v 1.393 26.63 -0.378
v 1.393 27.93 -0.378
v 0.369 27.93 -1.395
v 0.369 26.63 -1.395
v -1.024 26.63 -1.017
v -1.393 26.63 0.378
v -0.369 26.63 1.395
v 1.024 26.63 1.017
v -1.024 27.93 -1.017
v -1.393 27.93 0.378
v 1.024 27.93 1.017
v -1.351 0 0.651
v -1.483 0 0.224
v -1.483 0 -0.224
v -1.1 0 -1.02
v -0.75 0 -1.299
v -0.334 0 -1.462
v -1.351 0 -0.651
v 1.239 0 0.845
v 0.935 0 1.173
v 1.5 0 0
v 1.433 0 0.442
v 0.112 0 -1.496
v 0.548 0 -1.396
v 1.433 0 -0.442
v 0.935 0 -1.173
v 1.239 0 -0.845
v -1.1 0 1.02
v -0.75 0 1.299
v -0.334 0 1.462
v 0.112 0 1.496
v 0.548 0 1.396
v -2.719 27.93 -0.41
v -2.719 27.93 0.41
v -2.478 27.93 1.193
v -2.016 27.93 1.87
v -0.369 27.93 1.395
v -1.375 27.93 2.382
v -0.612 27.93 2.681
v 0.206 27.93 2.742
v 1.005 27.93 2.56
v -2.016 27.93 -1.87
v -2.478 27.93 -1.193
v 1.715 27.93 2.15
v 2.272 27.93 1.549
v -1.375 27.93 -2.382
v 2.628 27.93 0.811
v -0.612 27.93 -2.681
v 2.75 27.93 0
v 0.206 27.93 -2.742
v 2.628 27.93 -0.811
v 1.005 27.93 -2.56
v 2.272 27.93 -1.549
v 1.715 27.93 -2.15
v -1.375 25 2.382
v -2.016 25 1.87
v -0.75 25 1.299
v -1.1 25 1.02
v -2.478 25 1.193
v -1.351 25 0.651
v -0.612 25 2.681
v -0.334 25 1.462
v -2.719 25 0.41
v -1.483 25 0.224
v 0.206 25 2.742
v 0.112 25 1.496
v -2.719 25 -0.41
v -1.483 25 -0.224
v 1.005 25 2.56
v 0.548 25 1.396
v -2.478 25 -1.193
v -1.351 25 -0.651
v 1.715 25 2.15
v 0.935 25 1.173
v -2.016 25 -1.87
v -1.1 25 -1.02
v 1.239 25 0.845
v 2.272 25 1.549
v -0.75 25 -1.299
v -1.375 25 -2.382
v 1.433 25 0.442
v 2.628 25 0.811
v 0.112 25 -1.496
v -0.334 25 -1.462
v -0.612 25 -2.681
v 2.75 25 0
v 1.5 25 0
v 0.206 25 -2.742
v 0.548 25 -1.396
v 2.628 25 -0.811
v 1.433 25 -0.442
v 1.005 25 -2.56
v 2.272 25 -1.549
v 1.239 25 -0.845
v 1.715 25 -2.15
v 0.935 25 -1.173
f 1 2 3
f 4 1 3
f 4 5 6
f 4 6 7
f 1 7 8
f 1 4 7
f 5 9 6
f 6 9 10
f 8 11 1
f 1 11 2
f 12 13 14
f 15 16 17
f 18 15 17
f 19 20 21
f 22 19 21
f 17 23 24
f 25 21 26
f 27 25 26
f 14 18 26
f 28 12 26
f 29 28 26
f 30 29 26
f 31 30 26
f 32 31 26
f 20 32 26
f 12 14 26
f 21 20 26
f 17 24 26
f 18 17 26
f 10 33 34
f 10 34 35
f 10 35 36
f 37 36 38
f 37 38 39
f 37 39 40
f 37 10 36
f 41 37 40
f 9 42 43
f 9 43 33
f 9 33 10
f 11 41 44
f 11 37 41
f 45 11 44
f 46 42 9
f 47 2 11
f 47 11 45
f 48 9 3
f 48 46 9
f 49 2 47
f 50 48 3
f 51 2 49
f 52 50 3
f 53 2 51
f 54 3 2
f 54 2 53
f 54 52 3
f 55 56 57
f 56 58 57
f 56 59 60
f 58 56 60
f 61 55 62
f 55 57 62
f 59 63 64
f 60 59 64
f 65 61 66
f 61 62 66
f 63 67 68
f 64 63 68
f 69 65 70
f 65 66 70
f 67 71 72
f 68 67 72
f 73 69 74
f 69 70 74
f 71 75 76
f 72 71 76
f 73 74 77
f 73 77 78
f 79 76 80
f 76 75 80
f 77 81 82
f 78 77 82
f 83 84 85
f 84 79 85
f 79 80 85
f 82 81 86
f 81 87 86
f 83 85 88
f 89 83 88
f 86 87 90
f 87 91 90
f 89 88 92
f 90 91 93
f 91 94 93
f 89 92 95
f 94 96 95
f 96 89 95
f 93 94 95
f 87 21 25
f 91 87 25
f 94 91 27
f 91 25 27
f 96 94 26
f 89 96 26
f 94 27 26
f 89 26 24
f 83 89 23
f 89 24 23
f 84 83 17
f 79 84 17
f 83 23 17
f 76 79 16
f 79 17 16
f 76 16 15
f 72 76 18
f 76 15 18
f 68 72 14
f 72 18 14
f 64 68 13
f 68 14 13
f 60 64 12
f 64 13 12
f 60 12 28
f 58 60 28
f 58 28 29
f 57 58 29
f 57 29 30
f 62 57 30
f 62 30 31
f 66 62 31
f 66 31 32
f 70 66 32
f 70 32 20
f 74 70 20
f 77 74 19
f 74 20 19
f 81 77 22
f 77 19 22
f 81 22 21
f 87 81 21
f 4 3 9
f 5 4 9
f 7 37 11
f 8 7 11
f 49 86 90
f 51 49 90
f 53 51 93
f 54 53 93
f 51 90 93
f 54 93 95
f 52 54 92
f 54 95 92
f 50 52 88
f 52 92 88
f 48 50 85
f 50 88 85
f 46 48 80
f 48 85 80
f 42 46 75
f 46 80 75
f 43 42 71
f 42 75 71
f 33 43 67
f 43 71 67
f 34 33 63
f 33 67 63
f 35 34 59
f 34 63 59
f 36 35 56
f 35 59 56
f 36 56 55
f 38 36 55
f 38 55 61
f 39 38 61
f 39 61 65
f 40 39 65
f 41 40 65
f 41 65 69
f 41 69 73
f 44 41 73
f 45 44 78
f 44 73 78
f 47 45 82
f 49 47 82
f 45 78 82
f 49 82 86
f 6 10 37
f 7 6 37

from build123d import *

# Parameters (mm, degrees)
SKETCH_1_R          = 1.5
EXTRUDE_1_DEPTH     = 25
SKETCH_2_R          = 2.75
EXTRUDE_2_DEPTH     = 2.93
CUT_EXTRUDE_1_DEPTH = 1.3


with BuildPart() as part:
    # 草图1 → 凸台-拉伸1 (new body)
    with BuildSketch(Plane(origin=(0, 0, 0), x_dir=(1, 0, 0), z_dir=(0, 1, 0))):
        Circle(SKETCH_1_R)
    extrude(amount=EXTRUDE_1_DEPTH)

    # 草图2 → 凸台-拉伸2 (add)
    with BuildSketch(Plane(origin=(0, 25, 0), x_dir=(1, 0, 0), z_dir=(0, 1, 0))):
        Circle(SKETCH_2_R)
    extrude(amount=EXTRUDE_2_DEPTH)

    # 草图3 → 切除-拉伸1 (cut)
    with BuildSketch(Plane(origin=(0, 27.93, 0), x_dir=(1, 0, 0), z_dir=(0, 1, 0))):
        Polygon((1.024005842, -1.017224346), (1.392945046, 0.378202899), (0.368939204, 1.395427245), (-1.024005842, 1.017224346), (-1.392945046, -0.378202899), (-0.368939204, -1.395427245), align=None)
    extrude(amount=-CUT_EXTRUDE_1_DEPTH, mode=Mode.SUBTRACT)


solid = part.part
